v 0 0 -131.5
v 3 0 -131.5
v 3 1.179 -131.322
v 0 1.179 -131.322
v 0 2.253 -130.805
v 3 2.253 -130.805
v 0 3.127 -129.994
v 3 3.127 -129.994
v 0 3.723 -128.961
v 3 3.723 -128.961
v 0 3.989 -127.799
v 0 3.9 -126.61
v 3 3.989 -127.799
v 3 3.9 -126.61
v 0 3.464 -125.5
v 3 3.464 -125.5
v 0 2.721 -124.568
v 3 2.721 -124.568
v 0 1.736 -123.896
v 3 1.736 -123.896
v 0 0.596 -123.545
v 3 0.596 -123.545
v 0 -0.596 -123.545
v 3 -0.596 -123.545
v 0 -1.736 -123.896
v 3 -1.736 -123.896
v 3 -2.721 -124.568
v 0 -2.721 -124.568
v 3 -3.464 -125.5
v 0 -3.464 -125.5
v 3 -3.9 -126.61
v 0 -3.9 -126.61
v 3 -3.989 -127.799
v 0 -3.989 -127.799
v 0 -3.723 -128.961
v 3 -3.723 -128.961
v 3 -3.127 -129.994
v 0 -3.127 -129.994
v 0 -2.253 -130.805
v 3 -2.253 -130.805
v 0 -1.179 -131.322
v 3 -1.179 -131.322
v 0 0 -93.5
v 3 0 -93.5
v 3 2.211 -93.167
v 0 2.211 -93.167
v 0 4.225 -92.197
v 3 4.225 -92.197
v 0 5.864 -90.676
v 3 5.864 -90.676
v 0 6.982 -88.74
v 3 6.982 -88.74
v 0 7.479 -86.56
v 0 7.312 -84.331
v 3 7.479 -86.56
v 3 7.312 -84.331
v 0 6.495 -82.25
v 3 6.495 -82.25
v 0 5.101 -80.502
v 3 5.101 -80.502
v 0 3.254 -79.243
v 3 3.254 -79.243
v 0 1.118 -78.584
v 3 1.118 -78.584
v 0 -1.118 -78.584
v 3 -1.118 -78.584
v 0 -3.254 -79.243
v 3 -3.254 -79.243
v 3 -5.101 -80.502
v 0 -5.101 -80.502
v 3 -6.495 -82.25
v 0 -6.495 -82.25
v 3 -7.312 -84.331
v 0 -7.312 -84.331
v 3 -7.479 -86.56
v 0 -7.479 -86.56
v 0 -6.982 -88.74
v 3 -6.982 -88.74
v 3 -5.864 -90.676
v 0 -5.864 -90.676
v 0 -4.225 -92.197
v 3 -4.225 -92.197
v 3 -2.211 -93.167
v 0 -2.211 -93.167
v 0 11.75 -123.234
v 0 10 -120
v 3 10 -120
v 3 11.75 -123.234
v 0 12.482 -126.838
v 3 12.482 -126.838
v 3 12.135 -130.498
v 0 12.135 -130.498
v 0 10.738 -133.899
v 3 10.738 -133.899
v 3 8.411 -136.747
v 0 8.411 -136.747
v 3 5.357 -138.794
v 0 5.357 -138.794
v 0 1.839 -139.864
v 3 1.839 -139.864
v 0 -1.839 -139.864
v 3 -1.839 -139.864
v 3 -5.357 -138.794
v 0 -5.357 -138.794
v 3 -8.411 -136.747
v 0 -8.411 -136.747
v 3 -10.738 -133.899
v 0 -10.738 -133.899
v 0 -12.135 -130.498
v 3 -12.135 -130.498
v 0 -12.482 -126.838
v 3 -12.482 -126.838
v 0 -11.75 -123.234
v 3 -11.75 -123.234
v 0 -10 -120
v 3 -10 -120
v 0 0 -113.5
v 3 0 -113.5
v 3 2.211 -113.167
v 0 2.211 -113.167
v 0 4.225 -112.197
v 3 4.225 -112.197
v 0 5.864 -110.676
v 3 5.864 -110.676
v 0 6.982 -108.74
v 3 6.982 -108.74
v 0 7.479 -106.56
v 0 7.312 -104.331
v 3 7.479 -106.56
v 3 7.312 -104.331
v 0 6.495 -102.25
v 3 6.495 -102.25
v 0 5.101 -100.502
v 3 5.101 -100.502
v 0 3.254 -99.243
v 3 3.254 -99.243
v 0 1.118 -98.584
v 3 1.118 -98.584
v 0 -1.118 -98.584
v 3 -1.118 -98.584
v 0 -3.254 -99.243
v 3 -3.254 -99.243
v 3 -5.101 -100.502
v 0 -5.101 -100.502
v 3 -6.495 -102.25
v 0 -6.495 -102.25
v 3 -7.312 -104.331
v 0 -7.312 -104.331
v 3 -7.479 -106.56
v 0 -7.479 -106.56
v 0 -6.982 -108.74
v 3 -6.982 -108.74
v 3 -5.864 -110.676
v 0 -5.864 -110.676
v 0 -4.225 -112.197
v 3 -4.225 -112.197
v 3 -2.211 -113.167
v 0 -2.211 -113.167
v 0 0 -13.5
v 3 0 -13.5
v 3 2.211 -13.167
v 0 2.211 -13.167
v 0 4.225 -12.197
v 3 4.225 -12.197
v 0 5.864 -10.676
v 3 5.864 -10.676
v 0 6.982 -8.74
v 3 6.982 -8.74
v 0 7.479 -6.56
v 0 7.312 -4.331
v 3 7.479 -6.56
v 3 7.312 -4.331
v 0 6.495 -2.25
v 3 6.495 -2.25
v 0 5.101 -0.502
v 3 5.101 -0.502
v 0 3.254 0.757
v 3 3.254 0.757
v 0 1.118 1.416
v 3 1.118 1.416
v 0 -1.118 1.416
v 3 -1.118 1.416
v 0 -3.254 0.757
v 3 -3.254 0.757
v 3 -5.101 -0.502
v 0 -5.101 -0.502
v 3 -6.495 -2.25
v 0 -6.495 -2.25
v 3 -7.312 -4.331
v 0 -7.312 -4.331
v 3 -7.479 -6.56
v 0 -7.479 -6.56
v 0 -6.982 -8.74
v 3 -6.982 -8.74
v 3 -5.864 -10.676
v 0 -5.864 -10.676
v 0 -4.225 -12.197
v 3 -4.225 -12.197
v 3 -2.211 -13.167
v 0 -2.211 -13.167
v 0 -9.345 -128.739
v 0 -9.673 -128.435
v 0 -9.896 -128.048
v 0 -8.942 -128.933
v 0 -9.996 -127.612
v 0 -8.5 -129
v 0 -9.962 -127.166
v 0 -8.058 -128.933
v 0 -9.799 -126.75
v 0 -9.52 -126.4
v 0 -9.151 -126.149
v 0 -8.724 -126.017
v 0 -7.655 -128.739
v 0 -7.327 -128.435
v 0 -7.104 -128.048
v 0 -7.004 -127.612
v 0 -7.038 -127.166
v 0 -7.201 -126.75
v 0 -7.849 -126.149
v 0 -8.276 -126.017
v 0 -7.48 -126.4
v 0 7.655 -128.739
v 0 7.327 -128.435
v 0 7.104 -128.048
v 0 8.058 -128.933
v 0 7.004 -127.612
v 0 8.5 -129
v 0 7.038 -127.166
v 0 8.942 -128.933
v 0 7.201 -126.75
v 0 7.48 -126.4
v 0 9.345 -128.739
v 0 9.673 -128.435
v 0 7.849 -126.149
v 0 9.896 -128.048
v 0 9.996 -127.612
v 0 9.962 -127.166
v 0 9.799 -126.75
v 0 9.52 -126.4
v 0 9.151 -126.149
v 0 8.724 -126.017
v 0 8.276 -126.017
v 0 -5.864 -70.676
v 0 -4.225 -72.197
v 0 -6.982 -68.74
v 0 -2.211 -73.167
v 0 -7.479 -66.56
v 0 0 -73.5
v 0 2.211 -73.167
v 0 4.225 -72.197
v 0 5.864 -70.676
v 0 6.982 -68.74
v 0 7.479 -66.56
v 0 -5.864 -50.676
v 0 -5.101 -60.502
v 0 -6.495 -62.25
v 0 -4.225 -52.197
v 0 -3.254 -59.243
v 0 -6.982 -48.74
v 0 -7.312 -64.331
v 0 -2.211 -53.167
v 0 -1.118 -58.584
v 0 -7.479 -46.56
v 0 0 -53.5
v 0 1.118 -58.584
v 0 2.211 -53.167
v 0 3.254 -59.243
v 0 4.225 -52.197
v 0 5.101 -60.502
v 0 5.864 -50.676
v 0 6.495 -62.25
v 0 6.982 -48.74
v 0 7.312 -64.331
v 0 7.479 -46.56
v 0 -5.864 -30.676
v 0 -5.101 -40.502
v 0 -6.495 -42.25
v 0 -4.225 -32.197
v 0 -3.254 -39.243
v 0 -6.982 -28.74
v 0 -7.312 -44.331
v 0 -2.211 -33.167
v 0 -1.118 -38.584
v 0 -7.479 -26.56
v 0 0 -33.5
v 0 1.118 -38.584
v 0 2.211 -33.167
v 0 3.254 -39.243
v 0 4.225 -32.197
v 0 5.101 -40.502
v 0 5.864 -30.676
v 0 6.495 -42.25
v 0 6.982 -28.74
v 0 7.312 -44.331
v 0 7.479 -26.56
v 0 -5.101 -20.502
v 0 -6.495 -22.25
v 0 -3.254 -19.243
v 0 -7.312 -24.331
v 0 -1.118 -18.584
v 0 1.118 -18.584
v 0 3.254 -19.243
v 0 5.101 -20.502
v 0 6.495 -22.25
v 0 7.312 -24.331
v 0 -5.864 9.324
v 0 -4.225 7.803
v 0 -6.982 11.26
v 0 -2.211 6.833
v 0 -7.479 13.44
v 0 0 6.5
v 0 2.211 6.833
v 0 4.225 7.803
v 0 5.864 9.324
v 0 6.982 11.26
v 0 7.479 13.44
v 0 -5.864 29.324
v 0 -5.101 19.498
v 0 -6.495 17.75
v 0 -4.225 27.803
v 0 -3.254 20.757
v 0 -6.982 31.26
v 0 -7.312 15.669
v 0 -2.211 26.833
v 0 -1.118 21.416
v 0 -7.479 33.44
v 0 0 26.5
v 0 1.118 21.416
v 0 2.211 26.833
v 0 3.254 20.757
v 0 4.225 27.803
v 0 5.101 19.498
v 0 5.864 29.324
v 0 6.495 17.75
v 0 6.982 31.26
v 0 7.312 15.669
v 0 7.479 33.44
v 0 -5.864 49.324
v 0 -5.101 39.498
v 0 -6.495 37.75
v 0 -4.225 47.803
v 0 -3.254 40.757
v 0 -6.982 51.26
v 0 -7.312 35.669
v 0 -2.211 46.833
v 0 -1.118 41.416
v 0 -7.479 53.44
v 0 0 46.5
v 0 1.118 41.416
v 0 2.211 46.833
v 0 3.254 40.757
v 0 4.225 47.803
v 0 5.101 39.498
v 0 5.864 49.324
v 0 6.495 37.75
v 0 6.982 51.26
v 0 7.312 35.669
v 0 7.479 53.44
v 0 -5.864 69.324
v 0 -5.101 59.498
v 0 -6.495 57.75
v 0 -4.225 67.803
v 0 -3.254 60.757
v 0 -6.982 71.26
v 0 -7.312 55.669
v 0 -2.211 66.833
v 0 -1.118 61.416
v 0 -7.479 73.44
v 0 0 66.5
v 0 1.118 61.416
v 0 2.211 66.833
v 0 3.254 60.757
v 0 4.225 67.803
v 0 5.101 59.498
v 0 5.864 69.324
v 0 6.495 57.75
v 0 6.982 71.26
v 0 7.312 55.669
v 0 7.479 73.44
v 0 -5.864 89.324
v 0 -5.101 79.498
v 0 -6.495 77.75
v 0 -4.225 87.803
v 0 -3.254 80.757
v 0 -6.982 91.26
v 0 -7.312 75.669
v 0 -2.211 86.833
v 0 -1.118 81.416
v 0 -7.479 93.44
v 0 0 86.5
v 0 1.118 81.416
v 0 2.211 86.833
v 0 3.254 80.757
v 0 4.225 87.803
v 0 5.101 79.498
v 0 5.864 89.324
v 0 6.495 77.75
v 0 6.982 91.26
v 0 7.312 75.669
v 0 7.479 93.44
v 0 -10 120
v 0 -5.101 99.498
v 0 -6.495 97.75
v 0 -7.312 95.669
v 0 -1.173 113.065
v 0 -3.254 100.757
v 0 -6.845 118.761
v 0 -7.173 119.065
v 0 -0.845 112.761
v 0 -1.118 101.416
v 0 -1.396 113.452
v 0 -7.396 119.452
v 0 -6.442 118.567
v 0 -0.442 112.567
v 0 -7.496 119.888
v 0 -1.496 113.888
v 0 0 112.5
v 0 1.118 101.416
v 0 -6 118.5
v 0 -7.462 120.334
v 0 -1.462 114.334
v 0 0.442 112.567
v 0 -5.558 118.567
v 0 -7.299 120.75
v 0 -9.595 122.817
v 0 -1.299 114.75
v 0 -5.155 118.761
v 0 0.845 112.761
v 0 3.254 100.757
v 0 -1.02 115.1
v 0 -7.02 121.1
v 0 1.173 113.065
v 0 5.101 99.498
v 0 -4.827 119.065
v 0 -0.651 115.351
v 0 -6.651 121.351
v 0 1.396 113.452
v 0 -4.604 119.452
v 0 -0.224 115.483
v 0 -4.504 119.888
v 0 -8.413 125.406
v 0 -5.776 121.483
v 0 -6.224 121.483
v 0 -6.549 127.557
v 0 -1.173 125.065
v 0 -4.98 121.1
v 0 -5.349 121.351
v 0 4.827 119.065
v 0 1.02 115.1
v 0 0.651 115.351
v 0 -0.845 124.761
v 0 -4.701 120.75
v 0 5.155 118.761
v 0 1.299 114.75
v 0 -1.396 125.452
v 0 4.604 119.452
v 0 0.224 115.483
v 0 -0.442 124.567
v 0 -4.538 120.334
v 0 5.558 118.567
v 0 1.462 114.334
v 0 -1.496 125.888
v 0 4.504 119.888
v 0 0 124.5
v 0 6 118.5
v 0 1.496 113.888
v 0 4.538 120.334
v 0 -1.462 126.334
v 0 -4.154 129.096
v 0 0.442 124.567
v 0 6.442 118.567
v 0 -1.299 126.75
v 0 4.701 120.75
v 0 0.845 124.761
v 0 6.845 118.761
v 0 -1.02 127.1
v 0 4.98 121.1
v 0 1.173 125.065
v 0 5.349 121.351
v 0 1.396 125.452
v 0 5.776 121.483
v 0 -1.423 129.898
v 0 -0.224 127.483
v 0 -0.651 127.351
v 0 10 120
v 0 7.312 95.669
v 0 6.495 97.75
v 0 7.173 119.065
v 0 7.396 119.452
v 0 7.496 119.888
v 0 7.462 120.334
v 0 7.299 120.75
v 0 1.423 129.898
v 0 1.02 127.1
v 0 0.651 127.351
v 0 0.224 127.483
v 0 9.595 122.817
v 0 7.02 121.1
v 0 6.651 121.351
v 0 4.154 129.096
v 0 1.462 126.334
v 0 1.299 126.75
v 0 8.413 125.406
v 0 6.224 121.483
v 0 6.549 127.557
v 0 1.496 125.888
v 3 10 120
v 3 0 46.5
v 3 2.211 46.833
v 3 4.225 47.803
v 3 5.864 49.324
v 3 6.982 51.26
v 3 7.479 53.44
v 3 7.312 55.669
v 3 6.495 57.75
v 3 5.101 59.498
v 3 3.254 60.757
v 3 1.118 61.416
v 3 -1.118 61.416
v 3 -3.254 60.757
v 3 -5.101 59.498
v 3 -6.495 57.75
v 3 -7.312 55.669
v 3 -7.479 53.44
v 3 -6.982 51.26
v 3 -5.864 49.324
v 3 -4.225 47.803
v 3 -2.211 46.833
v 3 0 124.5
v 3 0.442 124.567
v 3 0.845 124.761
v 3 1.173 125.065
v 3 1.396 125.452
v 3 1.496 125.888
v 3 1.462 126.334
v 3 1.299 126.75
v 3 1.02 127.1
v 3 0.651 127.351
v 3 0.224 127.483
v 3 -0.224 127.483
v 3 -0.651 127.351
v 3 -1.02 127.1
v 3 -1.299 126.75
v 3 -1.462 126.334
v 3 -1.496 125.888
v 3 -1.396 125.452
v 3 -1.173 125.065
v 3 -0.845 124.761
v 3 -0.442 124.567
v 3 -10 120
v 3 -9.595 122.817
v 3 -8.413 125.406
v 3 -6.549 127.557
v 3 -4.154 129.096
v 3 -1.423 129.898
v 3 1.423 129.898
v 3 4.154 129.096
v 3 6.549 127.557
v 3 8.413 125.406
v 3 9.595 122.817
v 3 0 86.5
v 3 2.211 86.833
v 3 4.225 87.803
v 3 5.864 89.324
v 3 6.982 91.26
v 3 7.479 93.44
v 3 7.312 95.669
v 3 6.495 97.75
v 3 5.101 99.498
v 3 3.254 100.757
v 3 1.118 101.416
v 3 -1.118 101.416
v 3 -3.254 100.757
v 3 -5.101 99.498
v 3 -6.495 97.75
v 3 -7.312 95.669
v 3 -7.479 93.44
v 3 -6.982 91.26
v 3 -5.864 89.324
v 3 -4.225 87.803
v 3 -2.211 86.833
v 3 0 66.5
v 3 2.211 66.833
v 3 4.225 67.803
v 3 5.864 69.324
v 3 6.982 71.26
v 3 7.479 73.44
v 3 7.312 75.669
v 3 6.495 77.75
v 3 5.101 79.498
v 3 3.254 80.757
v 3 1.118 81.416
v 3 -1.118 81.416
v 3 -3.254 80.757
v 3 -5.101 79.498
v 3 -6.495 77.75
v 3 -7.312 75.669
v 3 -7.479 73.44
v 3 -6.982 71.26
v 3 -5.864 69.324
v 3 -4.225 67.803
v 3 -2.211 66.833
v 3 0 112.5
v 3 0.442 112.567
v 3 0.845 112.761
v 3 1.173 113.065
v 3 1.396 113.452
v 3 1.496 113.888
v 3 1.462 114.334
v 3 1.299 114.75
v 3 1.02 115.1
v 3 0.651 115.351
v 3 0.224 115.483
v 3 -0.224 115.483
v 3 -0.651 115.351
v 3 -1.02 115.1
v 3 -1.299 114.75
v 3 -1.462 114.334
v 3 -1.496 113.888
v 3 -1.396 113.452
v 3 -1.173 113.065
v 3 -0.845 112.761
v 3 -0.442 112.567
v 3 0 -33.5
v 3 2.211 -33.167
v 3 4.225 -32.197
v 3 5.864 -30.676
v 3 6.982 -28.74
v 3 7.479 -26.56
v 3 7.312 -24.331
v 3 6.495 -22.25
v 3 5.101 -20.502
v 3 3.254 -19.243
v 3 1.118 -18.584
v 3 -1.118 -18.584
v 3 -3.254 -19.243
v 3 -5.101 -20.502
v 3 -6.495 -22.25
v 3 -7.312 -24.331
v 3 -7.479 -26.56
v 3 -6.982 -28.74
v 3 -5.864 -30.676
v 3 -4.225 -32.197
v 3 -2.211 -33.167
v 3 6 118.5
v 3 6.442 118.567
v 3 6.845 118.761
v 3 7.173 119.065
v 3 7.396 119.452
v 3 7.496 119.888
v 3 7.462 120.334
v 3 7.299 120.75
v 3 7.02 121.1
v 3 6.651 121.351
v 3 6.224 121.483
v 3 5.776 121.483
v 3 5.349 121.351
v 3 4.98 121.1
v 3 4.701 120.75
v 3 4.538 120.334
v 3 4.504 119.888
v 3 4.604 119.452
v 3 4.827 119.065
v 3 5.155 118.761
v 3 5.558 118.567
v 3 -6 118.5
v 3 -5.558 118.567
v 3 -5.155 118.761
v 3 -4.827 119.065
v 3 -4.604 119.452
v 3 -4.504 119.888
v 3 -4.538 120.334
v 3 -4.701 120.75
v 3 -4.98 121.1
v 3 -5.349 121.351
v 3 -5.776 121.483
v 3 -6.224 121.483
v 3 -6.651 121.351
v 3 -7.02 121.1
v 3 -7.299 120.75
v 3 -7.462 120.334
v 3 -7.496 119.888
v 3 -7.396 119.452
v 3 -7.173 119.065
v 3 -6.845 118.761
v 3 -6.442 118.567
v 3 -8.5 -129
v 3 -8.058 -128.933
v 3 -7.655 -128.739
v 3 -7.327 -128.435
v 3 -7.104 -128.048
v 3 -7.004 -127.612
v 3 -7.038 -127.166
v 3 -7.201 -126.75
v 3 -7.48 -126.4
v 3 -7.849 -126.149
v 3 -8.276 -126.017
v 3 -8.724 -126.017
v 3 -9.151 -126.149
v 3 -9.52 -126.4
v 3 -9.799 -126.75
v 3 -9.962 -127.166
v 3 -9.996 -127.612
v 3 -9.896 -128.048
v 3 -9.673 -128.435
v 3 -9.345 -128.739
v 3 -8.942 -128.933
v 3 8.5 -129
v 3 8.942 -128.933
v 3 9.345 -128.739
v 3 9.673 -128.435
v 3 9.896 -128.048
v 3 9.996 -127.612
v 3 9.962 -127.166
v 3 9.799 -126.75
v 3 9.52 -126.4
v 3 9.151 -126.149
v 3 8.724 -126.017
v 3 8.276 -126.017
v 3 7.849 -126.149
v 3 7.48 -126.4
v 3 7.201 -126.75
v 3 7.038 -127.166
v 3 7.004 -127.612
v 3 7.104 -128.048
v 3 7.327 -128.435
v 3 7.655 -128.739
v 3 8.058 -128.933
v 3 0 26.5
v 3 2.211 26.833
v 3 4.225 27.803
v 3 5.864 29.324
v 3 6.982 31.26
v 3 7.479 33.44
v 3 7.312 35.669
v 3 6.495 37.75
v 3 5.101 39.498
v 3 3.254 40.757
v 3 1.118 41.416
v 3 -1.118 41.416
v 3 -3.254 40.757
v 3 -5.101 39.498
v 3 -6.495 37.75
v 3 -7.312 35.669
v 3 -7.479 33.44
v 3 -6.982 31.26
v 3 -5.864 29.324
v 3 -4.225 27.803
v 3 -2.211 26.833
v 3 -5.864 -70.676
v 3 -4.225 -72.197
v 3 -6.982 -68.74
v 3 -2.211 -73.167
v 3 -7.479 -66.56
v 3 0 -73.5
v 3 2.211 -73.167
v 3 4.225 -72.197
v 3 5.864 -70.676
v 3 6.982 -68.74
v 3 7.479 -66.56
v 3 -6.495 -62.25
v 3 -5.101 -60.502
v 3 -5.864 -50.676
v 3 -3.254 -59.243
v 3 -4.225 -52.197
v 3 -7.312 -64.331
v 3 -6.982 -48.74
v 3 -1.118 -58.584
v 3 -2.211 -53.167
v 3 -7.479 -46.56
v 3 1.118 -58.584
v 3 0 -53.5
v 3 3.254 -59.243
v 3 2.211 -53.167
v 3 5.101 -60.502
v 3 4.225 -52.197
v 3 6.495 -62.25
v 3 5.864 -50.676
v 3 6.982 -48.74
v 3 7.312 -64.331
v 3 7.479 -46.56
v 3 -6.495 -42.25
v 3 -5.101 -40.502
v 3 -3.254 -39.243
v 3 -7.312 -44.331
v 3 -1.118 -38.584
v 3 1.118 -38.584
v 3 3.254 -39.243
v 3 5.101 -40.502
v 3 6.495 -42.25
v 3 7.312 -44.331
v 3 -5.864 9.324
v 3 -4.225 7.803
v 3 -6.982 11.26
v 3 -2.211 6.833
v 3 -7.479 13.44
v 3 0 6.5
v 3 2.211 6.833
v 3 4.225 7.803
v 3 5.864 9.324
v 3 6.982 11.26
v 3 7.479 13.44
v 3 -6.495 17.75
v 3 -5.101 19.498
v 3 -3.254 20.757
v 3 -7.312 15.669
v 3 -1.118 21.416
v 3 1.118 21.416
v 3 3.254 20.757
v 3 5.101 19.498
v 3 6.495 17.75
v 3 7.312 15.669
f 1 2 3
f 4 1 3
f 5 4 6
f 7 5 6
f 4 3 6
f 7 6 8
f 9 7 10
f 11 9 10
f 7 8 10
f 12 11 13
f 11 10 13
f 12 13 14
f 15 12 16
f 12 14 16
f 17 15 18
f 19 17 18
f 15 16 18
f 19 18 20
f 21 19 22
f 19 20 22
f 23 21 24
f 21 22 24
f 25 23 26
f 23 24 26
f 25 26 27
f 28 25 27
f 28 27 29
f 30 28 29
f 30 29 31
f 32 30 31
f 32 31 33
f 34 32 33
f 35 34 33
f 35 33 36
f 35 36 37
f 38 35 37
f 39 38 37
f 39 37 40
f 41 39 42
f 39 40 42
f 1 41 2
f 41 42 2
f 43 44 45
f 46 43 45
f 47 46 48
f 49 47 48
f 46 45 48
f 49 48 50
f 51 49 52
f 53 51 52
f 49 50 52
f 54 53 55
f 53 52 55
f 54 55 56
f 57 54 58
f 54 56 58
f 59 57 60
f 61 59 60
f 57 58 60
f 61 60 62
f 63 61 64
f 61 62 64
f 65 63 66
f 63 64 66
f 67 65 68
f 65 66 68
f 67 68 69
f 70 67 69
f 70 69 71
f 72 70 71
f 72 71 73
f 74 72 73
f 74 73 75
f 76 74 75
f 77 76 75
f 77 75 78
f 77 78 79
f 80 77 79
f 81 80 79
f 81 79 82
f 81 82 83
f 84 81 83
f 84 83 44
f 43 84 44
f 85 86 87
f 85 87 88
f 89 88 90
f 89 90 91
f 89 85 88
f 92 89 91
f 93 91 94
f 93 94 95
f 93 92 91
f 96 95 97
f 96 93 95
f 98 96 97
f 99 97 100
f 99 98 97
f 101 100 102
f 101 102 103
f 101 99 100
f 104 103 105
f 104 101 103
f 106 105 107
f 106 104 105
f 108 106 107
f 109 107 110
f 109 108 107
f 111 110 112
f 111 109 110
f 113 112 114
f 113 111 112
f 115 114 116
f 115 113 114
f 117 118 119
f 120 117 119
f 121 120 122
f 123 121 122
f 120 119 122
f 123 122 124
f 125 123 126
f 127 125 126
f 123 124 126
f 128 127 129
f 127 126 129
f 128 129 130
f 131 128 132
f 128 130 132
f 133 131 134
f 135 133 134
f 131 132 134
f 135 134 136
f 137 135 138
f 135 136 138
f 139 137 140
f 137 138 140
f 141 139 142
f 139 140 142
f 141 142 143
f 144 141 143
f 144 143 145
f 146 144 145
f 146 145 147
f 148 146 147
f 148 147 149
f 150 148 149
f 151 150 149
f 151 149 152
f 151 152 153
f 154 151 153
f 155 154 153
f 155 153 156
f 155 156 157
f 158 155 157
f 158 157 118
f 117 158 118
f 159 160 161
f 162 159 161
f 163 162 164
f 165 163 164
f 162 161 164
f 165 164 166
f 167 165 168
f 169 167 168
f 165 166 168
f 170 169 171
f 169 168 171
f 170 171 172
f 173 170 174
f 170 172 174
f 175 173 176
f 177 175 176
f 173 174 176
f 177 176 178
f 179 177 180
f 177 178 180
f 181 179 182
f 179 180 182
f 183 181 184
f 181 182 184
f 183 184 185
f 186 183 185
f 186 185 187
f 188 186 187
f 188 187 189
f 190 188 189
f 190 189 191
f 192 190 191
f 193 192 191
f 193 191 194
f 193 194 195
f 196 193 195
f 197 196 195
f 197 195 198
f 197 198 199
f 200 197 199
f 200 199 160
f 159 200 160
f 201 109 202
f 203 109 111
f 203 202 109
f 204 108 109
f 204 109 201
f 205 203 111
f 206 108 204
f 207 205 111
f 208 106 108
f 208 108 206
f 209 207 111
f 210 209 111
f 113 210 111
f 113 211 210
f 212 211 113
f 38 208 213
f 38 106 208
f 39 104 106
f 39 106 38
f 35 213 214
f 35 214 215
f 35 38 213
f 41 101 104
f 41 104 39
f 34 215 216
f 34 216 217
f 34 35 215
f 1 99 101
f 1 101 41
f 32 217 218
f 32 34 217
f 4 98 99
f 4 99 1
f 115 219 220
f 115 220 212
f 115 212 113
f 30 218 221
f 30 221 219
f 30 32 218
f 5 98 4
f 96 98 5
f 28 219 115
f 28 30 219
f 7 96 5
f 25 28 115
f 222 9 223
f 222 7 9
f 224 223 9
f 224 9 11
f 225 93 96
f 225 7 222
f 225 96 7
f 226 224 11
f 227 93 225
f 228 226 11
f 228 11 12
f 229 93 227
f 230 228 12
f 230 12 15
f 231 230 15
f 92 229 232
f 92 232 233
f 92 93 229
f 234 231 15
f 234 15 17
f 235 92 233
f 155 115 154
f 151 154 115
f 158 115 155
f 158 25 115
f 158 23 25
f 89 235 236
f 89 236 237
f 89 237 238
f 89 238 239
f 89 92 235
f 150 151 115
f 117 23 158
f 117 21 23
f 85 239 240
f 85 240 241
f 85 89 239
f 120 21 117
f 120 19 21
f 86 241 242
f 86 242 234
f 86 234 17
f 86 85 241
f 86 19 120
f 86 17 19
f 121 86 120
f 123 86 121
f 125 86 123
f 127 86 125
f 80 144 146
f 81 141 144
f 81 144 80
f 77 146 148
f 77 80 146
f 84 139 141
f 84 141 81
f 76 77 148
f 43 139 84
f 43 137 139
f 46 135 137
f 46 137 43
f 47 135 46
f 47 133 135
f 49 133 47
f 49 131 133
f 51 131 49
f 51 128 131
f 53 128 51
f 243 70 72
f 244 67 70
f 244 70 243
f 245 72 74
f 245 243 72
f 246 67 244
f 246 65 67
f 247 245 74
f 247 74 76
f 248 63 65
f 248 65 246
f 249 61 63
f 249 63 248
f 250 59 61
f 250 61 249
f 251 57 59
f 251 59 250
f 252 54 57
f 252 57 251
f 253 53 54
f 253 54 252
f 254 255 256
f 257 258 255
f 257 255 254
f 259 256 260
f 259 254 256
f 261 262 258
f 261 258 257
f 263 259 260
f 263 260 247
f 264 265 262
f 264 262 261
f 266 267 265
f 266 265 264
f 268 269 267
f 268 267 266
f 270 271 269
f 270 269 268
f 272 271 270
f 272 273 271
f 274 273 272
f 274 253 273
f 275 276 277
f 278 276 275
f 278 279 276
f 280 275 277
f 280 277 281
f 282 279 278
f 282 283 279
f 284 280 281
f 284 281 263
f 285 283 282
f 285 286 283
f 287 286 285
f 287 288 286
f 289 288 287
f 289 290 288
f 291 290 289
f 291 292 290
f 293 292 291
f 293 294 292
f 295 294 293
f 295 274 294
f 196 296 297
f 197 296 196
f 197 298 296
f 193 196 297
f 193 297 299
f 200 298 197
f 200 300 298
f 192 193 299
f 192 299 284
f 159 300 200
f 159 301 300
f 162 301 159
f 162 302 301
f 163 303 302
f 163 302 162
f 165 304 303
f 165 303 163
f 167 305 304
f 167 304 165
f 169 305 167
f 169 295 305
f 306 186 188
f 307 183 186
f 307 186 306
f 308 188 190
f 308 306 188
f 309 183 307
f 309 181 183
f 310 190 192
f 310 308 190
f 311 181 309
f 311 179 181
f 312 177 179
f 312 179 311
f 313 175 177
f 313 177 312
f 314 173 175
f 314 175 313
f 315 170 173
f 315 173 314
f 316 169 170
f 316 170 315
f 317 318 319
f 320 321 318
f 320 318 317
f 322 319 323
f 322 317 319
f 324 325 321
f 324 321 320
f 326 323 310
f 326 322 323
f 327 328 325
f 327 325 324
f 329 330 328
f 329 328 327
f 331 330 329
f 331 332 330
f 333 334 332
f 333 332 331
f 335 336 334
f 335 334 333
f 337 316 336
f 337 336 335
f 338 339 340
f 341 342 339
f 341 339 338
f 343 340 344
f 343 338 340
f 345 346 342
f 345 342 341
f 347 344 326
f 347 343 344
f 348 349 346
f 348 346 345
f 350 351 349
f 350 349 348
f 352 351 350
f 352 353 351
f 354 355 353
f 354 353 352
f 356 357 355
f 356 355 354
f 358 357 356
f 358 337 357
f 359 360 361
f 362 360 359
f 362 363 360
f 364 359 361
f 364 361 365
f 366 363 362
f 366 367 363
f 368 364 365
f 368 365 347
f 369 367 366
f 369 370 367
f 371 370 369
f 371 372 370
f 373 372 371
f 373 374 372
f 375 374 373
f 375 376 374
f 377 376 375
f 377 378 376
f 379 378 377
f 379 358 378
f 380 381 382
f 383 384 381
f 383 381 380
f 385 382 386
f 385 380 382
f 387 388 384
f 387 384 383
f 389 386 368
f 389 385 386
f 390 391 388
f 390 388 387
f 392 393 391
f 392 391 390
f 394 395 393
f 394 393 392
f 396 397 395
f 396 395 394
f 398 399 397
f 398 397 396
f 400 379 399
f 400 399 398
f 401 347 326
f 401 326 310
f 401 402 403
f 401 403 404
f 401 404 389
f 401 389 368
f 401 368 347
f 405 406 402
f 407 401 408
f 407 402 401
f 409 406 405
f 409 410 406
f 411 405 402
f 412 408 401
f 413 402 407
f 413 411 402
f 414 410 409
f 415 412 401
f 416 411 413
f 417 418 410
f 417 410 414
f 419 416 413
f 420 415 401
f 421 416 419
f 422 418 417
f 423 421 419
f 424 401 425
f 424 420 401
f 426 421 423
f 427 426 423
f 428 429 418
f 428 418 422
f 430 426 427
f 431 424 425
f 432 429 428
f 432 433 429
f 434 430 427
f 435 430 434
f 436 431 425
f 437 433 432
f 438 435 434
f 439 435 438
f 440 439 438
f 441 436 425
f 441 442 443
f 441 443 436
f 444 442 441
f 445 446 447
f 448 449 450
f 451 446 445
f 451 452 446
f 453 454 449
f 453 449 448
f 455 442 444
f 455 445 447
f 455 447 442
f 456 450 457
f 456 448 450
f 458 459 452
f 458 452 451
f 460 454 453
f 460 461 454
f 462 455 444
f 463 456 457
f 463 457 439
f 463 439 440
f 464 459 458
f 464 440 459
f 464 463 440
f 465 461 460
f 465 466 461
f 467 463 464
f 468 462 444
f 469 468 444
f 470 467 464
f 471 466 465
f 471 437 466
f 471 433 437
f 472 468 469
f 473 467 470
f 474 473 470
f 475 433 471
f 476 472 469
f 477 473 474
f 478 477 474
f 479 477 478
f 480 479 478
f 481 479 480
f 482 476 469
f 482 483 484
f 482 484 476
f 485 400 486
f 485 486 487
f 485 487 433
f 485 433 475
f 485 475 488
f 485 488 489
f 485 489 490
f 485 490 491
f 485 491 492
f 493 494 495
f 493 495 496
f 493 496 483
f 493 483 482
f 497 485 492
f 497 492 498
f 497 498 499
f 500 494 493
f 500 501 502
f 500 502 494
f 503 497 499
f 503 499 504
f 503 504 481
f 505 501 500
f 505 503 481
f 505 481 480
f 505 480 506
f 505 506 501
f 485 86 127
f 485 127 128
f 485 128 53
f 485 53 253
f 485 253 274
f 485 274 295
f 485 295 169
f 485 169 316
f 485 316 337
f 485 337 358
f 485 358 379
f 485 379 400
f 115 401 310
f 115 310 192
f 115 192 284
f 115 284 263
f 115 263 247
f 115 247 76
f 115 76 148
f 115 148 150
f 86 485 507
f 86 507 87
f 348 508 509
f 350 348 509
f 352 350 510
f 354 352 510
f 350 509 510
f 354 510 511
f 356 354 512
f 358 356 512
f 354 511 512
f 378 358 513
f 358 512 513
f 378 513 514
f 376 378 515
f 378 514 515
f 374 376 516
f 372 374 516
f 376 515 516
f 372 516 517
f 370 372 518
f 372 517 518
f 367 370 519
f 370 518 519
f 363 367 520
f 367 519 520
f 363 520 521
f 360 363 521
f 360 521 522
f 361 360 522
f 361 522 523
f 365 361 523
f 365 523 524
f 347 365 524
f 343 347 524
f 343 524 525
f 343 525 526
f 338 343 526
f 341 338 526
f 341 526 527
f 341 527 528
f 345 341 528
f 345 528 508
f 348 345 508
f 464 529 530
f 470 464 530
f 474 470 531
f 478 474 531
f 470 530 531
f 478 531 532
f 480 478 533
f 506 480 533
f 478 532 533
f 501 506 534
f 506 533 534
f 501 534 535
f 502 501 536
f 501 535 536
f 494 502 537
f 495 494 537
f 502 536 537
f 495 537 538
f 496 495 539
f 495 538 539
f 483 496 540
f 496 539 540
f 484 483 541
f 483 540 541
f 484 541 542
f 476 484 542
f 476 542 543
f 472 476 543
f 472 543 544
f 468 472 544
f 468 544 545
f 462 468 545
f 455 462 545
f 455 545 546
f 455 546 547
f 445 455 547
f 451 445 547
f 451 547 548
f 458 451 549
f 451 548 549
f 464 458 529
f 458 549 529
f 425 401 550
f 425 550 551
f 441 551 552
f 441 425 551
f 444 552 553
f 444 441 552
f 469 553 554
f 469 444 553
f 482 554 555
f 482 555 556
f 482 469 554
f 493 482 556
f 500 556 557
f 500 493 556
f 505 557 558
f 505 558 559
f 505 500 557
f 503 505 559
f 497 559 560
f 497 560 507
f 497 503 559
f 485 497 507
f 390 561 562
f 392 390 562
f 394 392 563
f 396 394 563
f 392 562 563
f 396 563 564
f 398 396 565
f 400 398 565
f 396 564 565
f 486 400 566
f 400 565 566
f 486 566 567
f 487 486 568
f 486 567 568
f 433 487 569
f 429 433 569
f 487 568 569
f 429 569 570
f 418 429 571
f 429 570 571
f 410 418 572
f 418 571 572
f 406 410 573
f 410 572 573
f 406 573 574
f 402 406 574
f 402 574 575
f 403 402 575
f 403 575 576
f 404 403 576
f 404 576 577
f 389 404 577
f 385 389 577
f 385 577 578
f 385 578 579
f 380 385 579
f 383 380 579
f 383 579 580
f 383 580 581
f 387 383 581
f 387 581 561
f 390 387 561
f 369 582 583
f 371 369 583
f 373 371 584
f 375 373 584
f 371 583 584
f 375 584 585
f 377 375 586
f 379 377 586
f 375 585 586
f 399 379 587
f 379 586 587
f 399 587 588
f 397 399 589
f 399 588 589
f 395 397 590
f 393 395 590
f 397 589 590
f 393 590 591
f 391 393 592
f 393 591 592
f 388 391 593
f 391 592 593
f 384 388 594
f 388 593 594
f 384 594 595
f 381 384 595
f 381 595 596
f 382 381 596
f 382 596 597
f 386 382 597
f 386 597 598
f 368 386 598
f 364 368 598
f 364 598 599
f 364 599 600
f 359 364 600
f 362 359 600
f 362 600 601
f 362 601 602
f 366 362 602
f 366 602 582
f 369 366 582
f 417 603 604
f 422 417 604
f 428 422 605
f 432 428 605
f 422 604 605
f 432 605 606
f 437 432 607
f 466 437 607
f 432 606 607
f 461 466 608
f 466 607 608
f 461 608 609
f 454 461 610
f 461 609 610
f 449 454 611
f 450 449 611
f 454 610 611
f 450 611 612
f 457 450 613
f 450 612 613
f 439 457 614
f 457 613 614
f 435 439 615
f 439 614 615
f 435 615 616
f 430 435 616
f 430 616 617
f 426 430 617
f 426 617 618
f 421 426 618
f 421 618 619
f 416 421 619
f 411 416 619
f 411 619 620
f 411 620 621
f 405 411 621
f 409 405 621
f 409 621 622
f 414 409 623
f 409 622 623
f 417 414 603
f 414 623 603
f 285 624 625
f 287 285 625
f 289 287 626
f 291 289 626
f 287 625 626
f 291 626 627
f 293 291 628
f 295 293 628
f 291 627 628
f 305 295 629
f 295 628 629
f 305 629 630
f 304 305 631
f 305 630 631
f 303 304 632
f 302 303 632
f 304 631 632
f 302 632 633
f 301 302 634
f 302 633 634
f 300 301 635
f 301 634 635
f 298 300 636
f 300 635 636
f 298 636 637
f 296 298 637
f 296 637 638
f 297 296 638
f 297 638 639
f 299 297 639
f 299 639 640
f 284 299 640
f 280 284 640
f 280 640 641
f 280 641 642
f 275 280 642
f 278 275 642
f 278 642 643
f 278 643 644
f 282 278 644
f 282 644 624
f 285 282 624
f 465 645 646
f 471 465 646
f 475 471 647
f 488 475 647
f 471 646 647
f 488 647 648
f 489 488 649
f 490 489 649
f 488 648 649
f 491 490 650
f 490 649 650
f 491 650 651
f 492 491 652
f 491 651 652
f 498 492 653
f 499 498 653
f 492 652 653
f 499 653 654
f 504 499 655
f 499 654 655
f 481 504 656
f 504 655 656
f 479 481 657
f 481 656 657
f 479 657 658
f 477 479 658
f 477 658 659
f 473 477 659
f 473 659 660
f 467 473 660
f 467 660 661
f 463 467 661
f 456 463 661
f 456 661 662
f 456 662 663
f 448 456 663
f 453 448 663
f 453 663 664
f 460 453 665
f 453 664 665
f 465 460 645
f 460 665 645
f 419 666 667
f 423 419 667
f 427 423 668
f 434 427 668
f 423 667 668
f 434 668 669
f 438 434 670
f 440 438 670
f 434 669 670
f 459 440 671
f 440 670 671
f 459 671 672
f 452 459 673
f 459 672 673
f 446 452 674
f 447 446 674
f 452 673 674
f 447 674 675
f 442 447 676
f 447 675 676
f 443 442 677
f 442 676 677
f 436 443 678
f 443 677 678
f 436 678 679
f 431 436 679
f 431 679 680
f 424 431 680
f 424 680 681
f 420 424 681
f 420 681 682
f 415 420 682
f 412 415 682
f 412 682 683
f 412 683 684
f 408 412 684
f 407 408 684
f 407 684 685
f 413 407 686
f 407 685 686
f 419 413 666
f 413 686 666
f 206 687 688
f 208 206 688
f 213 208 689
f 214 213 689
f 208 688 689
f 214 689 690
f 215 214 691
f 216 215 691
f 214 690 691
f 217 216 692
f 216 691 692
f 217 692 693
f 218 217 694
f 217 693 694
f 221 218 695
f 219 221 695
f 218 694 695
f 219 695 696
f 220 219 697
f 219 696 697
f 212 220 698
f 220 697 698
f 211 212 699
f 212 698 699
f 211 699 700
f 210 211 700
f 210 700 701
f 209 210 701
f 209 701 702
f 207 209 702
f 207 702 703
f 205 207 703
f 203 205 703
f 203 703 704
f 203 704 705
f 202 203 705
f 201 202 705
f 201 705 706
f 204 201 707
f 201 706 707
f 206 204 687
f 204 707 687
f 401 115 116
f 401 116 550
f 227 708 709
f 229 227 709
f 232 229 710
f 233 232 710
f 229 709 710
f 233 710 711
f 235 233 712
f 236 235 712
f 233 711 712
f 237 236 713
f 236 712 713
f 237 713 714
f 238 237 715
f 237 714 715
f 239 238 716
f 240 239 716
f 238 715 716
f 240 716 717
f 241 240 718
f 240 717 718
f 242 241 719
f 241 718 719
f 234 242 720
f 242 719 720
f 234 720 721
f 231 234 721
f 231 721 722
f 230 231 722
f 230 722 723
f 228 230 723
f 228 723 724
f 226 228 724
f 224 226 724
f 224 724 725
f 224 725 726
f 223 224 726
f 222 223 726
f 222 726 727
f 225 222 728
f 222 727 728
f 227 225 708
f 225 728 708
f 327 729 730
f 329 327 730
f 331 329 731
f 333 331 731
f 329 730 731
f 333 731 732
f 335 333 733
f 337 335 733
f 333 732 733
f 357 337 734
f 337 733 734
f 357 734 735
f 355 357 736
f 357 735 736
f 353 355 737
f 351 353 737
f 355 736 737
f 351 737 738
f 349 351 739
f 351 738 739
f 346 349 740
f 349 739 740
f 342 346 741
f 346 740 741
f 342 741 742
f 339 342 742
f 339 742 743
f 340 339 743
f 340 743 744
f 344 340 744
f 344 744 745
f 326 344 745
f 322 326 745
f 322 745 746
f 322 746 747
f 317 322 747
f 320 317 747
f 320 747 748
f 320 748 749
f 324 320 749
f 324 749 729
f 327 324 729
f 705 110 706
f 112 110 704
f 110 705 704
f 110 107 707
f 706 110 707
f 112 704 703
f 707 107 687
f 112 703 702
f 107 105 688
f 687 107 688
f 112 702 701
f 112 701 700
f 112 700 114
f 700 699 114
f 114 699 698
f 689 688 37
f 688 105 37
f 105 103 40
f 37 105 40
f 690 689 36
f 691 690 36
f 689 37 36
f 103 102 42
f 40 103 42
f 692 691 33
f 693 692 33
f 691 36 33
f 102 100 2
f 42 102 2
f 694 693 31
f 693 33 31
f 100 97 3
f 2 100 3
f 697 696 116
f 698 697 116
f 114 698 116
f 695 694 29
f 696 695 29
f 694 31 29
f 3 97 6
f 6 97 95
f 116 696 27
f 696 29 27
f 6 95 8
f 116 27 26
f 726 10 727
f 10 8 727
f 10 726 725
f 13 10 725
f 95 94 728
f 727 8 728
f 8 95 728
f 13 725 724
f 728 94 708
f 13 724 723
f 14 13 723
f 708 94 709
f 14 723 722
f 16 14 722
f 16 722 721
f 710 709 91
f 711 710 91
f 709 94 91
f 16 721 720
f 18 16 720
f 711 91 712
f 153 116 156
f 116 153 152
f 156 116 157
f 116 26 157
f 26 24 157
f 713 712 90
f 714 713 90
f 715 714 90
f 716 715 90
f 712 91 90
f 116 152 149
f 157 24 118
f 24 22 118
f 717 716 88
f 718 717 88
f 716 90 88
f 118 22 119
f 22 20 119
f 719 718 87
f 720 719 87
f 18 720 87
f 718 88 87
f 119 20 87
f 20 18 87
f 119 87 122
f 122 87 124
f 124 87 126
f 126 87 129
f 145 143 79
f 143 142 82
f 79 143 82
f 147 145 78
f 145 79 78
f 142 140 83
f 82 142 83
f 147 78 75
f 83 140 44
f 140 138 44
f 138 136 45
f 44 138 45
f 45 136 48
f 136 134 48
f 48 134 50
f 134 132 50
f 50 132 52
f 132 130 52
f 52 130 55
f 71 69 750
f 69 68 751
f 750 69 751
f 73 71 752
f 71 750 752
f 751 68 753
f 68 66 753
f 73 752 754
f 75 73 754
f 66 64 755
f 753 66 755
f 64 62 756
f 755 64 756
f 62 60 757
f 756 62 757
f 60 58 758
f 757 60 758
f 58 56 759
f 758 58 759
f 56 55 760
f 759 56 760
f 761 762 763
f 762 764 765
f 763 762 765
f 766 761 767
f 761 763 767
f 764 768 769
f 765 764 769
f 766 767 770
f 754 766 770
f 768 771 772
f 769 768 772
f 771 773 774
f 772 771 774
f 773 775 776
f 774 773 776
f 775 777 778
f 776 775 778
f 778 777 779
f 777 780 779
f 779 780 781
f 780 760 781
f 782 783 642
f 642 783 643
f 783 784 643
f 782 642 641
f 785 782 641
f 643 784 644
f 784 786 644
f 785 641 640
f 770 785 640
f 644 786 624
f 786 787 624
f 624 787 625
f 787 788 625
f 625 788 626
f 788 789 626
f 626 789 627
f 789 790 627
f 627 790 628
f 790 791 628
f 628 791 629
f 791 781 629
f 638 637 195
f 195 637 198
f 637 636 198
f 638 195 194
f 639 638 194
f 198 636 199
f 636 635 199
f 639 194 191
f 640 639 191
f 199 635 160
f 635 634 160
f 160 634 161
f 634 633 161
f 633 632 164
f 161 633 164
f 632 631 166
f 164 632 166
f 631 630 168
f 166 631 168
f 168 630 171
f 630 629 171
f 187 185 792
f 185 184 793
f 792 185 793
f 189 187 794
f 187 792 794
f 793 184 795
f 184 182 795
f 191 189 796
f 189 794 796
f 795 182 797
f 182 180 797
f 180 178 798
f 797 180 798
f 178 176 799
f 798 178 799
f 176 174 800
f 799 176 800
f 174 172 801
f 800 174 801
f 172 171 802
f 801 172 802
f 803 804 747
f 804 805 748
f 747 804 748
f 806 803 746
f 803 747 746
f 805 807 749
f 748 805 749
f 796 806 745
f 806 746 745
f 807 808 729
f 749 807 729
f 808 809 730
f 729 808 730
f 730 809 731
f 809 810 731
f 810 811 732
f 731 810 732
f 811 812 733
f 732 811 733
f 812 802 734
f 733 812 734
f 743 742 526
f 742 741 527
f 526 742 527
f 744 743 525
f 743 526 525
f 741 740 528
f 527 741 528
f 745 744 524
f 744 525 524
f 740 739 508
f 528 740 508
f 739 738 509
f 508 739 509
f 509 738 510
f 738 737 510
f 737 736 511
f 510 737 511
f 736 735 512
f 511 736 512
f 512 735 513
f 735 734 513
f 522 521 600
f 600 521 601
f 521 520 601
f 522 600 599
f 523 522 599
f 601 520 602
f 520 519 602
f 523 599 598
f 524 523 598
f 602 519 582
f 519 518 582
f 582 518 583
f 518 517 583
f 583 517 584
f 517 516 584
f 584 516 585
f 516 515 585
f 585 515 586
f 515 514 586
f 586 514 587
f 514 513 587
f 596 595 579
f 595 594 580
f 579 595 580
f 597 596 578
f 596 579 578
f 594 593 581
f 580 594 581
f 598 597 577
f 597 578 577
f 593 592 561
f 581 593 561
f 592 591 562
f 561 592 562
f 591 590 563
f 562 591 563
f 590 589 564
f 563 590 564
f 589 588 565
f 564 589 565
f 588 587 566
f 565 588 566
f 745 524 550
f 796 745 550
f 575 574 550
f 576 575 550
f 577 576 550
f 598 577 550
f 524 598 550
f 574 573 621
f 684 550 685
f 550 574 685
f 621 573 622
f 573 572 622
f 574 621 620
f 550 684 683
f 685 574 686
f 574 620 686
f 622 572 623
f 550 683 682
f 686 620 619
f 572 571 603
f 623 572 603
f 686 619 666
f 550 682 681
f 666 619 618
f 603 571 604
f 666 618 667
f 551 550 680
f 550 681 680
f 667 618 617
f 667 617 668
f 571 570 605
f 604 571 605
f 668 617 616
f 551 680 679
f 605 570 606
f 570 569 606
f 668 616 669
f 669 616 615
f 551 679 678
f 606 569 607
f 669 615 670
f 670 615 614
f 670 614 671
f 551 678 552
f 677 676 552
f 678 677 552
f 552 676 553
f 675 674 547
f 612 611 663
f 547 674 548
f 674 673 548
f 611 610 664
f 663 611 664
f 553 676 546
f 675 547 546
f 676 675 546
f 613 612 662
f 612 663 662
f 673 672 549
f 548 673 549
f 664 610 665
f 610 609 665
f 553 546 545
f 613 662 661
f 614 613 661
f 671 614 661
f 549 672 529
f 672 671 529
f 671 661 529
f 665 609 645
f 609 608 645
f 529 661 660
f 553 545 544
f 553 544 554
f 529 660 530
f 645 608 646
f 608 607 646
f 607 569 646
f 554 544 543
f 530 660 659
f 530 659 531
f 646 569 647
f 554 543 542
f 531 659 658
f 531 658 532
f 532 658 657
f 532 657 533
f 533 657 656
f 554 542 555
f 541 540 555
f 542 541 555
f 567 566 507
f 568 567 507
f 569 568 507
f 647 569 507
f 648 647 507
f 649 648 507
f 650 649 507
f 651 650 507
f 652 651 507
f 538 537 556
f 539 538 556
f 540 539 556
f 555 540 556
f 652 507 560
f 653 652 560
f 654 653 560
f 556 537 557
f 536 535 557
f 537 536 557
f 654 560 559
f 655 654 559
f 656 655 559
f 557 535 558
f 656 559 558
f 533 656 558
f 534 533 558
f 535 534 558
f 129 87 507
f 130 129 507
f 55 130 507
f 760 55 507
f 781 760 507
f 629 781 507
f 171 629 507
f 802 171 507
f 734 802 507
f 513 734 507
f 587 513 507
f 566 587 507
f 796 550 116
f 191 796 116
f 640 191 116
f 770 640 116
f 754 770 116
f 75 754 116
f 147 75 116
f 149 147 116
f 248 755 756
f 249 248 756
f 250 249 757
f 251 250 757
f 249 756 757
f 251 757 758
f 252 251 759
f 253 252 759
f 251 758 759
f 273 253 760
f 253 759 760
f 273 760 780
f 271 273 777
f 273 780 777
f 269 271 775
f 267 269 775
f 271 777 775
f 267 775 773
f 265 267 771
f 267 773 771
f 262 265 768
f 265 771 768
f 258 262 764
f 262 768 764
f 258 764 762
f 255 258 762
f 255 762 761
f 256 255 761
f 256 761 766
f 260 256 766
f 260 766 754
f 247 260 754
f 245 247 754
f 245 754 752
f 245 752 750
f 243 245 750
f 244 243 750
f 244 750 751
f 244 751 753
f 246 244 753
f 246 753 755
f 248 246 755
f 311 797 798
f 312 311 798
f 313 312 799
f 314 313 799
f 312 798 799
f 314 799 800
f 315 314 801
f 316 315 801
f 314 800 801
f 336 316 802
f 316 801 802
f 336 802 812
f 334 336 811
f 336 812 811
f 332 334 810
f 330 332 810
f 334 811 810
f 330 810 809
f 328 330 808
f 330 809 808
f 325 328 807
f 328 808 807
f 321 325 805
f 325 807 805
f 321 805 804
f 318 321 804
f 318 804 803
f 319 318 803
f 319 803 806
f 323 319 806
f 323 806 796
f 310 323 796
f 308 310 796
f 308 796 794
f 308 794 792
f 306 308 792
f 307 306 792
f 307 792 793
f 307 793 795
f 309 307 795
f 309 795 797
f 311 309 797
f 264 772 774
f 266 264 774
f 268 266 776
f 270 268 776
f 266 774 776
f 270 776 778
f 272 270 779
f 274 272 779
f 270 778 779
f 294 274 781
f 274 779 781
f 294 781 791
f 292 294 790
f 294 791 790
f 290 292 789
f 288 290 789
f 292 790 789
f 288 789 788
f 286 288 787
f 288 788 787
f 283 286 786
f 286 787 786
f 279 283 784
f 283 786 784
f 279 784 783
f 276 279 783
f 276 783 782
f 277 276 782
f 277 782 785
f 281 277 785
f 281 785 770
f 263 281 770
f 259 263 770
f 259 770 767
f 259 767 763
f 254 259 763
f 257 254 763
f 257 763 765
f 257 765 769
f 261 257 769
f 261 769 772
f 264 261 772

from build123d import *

# Parameters (mm, degrees)
EXTRUDE_1_DEPTH     = 3
SKETCH_2_R          = 1.5
SKETCH_2_R_2        = 4
CUT_EXTRUDE_1_DEPTH = 3
SKETCH_4_R          = 7.5
CUT_EXTRUDE_2_DEPTH = 250


with BuildPart() as part:
    # 草图1 → 凸台-拉伸1 (new body)
    with BuildSketch(Plane(origin=(0, 0, 0), x_dir=(0, 0, -1), z_dir=(1, 0, 0))):
        with BuildLine():
            Line((-120, 10), (120, 10))
            ThreePointArc((120, 10), (140, 0), (120, -10))
            Line((120, -10), (-120, -10))
            ThreePointArc((-120, -10), (-130.000001885, 0), (-120, 10))
        make_face()
    extrude(amount=EXTRUDE_1_DEPTH)

    # 草图2 → 切除-拉伸1 (cut)
    with BuildSketch(Plane(origin=(3, 0, 0), x_dir=(0, 0, -1), z_dir=(1, 0, 0))):
        with Locations((-120, 6)):
            Circle(SKETCH_2_R)
        with Locations((-114, 0)):
            Circle(SKETCH_2_R)
        with Locations((-120, -6)):
            Circle(SKETCH_2_R)
        with Locations((-126, 0)):
            Circle(SKETCH_2_R)
        with Locations((127.5, 8.5)):
            Circle(SKETCH_2_R)
        with Locations((127.5, -8.5)):
            Circle(SKETCH_2_R)
        with Locations((127.5, 0)):
            Circle(SKETCH_2_R_2)
    extrude(amount=-CUT_EXTRUDE_1_DEPTH, mode=Mode.SUBTRACT)

    # 草图4 → 切除-拉伸2 (cut)
    with BuildSketch(Plane(origin=(3, 0, 0), x_dir=(0, 0, -1), z_dir=(1, 0, 0))):
        with Locations((-94, 0)):
            Circle(SKETCH_4_R)
        with Locations((-74, 0)):
            Circle(SKETCH_4_R)
        with Locations((-54, 0)):
            Circle(SKETCH_4_R)
        with Locations((-34, 0)):
            Circle(SKETCH_4_R)
        with Locations((-14, 0)):
            Circle(SKETCH_4_R)
        with Locations((6, 0)):
            Circle(SKETCH_4_R)
        with Locations((26, 0)):
            Circle(SKETCH_4_R)
        with Locations((46, 0)):
            Circle(SKETCH_4_R)
        with Locations((66, 0)):
            Circle(SKETCH_4_R)
        with Locations((86, 0)):
            Circle(SKETCH_4_R)
        with Locations((106, 0)):
            Circle(SKETCH_4_R)
    extrude(amount=-CUT_EXTRUDE_2_DEPTH, mode=Mode.SUBTRACT)


solid = part.part
